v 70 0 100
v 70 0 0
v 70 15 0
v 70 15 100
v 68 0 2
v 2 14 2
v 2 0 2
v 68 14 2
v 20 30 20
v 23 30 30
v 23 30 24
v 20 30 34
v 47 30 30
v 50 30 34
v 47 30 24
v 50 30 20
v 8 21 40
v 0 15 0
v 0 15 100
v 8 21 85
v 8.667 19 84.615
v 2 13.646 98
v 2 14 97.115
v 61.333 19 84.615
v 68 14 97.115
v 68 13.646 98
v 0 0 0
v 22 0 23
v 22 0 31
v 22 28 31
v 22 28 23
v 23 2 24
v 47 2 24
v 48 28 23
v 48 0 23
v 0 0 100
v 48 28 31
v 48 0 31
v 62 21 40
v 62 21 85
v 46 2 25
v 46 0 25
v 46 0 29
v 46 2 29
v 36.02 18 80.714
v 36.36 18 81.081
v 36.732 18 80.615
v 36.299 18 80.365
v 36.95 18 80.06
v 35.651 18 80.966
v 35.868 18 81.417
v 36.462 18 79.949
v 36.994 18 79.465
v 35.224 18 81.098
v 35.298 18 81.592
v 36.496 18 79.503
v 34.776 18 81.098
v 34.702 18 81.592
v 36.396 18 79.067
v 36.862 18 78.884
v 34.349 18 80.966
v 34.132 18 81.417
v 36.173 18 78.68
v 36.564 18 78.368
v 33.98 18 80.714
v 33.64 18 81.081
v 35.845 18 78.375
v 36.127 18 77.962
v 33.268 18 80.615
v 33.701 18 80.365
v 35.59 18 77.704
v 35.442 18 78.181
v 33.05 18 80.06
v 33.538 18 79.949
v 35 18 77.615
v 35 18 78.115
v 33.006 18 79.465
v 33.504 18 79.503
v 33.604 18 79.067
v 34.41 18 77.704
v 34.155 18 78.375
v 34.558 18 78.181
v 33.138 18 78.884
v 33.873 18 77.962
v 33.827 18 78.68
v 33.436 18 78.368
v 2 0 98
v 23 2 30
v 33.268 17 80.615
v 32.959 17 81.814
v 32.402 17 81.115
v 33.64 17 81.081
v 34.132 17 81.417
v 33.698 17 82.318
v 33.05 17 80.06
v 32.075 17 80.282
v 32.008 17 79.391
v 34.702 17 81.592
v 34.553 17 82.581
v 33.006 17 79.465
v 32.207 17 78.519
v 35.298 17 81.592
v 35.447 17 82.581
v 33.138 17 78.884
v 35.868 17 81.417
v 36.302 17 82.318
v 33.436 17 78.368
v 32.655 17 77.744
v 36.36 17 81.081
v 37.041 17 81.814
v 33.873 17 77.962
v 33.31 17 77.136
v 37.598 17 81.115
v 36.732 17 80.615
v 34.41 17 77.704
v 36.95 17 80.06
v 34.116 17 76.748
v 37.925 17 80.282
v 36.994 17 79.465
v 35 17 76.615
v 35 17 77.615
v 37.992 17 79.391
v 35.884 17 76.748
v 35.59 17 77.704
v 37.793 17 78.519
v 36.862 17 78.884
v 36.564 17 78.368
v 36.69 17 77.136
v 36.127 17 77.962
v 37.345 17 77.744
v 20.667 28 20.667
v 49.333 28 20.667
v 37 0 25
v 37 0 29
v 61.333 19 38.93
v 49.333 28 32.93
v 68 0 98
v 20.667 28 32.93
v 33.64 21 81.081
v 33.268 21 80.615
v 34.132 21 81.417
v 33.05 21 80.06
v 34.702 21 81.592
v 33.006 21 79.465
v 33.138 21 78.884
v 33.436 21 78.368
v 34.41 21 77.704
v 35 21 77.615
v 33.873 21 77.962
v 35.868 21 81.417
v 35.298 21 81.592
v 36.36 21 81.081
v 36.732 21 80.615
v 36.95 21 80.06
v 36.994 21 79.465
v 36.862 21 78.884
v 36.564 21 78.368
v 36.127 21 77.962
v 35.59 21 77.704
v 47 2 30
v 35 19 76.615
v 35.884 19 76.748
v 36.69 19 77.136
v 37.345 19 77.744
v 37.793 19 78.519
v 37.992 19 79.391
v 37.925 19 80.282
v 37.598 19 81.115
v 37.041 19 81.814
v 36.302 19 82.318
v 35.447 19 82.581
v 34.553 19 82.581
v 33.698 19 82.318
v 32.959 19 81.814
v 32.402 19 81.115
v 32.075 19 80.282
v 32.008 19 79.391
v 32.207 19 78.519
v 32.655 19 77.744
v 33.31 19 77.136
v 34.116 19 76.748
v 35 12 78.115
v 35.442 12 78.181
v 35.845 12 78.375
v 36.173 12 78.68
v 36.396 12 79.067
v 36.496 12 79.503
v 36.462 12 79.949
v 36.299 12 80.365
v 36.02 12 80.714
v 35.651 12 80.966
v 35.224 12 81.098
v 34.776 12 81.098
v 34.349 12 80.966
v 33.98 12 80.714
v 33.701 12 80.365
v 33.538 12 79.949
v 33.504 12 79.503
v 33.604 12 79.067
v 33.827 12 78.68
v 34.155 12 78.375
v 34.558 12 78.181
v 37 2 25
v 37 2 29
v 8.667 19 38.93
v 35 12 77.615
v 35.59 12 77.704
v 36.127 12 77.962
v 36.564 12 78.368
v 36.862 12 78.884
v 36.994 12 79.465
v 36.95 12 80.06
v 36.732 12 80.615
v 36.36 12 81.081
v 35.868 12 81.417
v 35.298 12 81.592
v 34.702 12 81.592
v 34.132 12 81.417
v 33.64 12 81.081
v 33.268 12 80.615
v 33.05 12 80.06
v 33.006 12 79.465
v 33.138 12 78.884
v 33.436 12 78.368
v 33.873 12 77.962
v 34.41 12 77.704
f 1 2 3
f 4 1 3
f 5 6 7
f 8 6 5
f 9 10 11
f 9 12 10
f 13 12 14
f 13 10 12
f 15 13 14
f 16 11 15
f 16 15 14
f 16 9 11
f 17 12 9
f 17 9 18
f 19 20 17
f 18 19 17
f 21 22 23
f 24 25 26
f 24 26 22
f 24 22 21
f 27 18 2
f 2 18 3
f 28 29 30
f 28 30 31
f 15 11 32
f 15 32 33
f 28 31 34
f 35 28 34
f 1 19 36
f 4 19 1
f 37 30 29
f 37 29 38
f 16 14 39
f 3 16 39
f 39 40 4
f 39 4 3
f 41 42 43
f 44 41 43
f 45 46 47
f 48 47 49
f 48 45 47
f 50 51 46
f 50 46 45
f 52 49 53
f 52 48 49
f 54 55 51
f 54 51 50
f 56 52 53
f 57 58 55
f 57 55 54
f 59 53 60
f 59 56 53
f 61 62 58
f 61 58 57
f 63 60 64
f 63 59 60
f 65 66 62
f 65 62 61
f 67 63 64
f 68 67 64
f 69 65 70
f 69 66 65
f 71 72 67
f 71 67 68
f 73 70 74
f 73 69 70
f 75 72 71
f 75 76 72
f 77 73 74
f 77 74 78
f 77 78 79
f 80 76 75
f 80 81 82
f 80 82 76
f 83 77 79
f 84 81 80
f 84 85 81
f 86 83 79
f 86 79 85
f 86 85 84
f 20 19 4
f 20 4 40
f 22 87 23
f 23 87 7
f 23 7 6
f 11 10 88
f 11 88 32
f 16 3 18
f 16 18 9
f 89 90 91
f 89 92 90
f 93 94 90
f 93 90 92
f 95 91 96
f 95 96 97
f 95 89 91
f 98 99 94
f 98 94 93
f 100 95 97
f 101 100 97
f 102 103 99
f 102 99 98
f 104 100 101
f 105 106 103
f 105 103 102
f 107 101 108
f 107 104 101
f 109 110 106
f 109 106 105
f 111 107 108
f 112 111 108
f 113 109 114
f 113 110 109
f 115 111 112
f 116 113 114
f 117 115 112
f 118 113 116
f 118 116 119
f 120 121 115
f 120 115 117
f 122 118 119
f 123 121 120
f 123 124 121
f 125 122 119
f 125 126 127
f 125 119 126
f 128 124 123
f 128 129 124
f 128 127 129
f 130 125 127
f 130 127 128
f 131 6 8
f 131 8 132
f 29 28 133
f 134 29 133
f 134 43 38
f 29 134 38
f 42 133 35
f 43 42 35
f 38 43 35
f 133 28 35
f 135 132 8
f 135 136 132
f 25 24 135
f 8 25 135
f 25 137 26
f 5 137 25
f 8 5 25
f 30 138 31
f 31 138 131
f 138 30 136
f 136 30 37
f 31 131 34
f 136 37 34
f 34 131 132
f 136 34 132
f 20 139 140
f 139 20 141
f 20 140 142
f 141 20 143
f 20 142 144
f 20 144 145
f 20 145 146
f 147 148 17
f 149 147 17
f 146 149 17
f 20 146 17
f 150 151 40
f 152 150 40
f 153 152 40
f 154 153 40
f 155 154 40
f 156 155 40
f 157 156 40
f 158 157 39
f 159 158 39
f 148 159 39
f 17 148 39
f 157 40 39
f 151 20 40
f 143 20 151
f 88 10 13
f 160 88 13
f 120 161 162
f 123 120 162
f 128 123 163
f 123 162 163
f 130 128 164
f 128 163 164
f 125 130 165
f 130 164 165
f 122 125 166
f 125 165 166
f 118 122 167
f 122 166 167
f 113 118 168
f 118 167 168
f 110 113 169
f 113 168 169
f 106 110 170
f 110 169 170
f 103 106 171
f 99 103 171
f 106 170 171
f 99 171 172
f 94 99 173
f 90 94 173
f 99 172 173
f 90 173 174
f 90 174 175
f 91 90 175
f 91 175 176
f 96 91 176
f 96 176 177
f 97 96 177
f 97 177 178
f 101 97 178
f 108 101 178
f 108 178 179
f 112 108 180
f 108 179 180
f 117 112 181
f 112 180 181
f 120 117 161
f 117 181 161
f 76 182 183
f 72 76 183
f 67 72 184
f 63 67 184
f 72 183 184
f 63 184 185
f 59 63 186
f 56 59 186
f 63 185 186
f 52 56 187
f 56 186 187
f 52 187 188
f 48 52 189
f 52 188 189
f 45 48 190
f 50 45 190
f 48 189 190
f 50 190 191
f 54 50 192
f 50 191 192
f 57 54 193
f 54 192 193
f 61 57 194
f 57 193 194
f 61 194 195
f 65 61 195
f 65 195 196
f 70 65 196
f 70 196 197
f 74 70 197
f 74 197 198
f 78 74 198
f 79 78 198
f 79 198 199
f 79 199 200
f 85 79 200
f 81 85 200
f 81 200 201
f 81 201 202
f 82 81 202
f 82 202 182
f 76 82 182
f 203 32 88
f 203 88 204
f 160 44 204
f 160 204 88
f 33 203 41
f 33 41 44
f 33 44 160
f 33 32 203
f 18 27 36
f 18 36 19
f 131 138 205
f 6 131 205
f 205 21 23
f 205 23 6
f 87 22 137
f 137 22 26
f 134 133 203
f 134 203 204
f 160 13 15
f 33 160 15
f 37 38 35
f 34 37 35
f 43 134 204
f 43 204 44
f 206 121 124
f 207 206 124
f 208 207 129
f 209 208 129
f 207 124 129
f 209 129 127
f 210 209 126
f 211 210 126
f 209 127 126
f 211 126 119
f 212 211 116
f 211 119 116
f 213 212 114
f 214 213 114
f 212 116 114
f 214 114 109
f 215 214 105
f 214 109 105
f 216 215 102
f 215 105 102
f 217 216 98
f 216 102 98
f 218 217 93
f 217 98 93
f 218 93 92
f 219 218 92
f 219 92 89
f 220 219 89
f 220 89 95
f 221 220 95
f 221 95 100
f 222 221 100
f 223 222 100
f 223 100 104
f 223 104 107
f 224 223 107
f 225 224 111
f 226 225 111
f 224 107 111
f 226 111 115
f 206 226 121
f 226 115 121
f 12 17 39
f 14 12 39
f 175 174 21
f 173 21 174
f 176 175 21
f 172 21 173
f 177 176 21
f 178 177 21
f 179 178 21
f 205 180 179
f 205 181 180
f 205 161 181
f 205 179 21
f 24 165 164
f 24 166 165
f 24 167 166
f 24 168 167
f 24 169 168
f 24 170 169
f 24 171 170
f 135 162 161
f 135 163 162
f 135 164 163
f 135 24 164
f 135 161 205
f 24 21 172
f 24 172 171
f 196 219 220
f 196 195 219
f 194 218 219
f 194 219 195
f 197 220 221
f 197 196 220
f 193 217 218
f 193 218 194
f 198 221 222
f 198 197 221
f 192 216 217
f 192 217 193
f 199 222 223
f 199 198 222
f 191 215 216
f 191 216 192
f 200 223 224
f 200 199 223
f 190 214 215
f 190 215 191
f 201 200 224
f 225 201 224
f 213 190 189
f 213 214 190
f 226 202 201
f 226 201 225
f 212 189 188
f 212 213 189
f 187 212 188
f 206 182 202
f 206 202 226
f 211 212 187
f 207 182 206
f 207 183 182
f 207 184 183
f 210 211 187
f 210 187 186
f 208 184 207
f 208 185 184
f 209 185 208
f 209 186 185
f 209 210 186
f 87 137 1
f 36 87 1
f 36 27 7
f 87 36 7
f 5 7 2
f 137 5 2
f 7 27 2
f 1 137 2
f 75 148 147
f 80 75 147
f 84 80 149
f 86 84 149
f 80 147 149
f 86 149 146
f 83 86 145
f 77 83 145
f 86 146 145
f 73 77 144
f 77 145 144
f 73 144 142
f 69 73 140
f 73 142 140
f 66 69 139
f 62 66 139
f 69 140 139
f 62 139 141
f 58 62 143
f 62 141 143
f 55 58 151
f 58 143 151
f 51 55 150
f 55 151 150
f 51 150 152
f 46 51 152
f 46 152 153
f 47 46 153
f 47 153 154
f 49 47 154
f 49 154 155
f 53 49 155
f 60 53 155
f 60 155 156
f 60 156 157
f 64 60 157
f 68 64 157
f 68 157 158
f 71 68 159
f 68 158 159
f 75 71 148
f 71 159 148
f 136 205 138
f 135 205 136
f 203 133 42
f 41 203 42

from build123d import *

# Parameters (mm, degrees)
SKIZZE1_W                       = 70
SKIZZE1_H                       = 30
AUFSATZ_LINEAR_AUSTRAGEN1_DEPTH = 100
SCHNITT_LINEAR_AUSTRAGEN2_DEPTH = 126.6980509
SCHNITT_LINEAR_AUSTRAGEN3_DEPTH = 100
SCHNITT_LINEAR_AUSTRAGEN4_DEPTH = 126.6980509
WANDUNG1_T                      = -2
SKIZZE10_R                      = 3
AUFSATZ_LINEAR_AUSTRAGEN2_DEPTH = 2
SKIZZE12_R                      = 2
AUFSATZ_LINEAR_AUSTRAGEN3_DEPTH = 5
SKIZZE13_R                      = 1.5
SCHNITT_LINEAR_AUSTRAGEN5_DEPTH = 124.385574521
SKIZZE15_R                      = 2
SCHNITT_LINEAR_AUSTRAGEN6_DEPTH = 3
SKIZZE26_W                      = 26
SKIZZE26_H                      = 8
AUFSATZ_LINEAR_AUSTRAGEN4_DEPTH = 30
SKIZZE27_W                      = 24
SKIZZE27_H                      = 6
SCHNITT_LINEAR_AUSTRAGEN8_DEPTH = 28
SCHNITT_LINEAR_AUSTRAGEN9_REACH = 127.698
SKIZZE28_W                      = 9
SKIZZE28_H                      = 4


with BuildPart() as part:
    # Skizze1 → Aufsatz-Linear austragen1 (new body)
    with BuildSketch(Plane.XY):
        with Locations((35, 15)):
            Rectangle(SKIZZE1_W, SKIZZE1_H)
    extrude(amount=AUFSATZ_LINEAR_AUSTRAGEN1_DEPTH)

    # Skizze4 → Schnitt-Linear austragen2 (cut, through all)
    with BuildSketch(Plane(origin=(70, 0, 0), x_dir=(0, 0, -1), z_dir=(1, 0, 0))):
        Polygon((0, 15), (-20, 30), (0, 30), align=None)
    extrude(amount=-SCHNITT_LINEAR_AUSTRAGEN2_DEPTH, mode=Mode.SUBTRACT)

    # Skizze5 → Schnitt-Linear austragen3 (cut)
    with BuildSketch(Plane.XY.offset(100)):
        Polygon((0, 30), (20, 30), (0, 15), align=None)
        Polygon((70, 30), (50, 30), (70, 15), align=None)
    extrude(amount=-SCHNITT_LINEAR_AUSTRAGEN3_DEPTH, mode=Mode.SUBTRACT)

    # Skizze8 → Schnitt-Linear austragen4 (cut, through all)
    with BuildSketch(Plane(origin=(70, 0, 0), x_dir=(0, 0, -1), z_dir=(1, 0, 0))):
        Polygon((-100, 30), (-100, 15), (-85, 21), (-40, 21), (-34, 30), align=None)
    extrude(amount=-SCHNITT_LINEAR_AUSTRAGEN4_DEPTH, mode=Mode.SUBTRACT)

    # Wandung1
    wandung1_openings = [part.faces().sort_by_distance(p)[0] for p in [
        (35, 0, 50),
    ]]
    offset(amount=WANDUNG1_T, openings=wandung1_openings, kind=Kind.INTERSECTION)

    # Skizze10 → Aufsatz-Linear austragen2 (add)
    with BuildSketch(Plane.XZ.offset(-19)):
        with Locations((35, 79.614835193)):
            Circle(SKIZZE10_R)
    extrude(amount=AUFSATZ_LINEAR_AUSTRAGEN2_DEPTH)

    # Skizze12 → Aufsatz-Linear austragen3 (add)
    with BuildSketch(Plane.XZ.offset(-17)):
        with Locations((35, 79.614835193)):
            Circle(SKIZZE12_R)
    extrude(amount=AUFSATZ_LINEAR_AUSTRAGEN3_DEPTH)

    # Skizze13 → Schnitt-Linear austragen5 (cut, through all)
    with BuildSketch(Plane.XZ.offset(-12)):
        with Locations((35, 79.614835193)):
            Circle(SKIZZE13_R)
    extrude(amount=-SCHNITT_LINEAR_AUSTRAGEN5_DEPTH, mode=Mode.SUBTRACT)

    # Skizze15 → Schnitt-Linear austragen6 (cut)
    with BuildSketch(Plane(origin=(0, 21, 0), x_dir=(1, 0, 0), z_dir=(0, 1, 0))):
        with Locations((35, -79.614835193)):
            Circle(SKIZZE15_R)
    extrude(amount=-SCHNITT_LINEAR_AUSTRAGEN6_DEPTH, mode=Mode.SUBTRACT)

    # Skizze26 → Aufsatz-Linear austragen4 (add)
    with BuildSketch(Plane(origin=(0, 30, 0), x_dir=(1, 0, 0), z_dir=(0, 1, 0))):
        with Locations((35, -27)):
            Rectangle(SKIZZE26_W, SKIZZE26_H)
    extrude(amount=-AUFSATZ_LINEAR_AUSTRAGEN4_DEPTH)

    # Skizze27 → Schnitt-Linear austragen8 (cut)
    with BuildSketch(Plane(origin=(0, 30, 0), x_dir=(1, 0, 0), z_dir=(0, 1, 0))):
        with Locations((35, -27)):
            Rectangle(SKIZZE27_W, SKIZZE27_H)
    extrude(amount=-SCHNITT_LINEAR_AUSTRAGEN8_DEPTH, mode=Mode.SUBTRACT)

    # Skizze28 → Schnitt-Linear austragen9 (cut, up to next)
    with BuildSketch(Plane.XZ, mode=Mode.PRIVATE) as schnitt_linear_austragen9_sk1:
        with Locations((41.5, 27)):
            Rectangle(SKIZZE28_W, SKIZZE28_H)
    schnitt_linear_austragen9_tool1 = extrude(schnitt_linear_austragen9_sk1.sketch, amount=-SCHNITT_LINEAR_AUSTRAGEN9_REACH, mode=Mode.PRIVATE) & part.part
    add(schnitt_linear_austragen9_tool1.solids().sort_by_distance((41.5, 0, 27))[0], mode=Mode.SUBTRACT)


solid = part.part
